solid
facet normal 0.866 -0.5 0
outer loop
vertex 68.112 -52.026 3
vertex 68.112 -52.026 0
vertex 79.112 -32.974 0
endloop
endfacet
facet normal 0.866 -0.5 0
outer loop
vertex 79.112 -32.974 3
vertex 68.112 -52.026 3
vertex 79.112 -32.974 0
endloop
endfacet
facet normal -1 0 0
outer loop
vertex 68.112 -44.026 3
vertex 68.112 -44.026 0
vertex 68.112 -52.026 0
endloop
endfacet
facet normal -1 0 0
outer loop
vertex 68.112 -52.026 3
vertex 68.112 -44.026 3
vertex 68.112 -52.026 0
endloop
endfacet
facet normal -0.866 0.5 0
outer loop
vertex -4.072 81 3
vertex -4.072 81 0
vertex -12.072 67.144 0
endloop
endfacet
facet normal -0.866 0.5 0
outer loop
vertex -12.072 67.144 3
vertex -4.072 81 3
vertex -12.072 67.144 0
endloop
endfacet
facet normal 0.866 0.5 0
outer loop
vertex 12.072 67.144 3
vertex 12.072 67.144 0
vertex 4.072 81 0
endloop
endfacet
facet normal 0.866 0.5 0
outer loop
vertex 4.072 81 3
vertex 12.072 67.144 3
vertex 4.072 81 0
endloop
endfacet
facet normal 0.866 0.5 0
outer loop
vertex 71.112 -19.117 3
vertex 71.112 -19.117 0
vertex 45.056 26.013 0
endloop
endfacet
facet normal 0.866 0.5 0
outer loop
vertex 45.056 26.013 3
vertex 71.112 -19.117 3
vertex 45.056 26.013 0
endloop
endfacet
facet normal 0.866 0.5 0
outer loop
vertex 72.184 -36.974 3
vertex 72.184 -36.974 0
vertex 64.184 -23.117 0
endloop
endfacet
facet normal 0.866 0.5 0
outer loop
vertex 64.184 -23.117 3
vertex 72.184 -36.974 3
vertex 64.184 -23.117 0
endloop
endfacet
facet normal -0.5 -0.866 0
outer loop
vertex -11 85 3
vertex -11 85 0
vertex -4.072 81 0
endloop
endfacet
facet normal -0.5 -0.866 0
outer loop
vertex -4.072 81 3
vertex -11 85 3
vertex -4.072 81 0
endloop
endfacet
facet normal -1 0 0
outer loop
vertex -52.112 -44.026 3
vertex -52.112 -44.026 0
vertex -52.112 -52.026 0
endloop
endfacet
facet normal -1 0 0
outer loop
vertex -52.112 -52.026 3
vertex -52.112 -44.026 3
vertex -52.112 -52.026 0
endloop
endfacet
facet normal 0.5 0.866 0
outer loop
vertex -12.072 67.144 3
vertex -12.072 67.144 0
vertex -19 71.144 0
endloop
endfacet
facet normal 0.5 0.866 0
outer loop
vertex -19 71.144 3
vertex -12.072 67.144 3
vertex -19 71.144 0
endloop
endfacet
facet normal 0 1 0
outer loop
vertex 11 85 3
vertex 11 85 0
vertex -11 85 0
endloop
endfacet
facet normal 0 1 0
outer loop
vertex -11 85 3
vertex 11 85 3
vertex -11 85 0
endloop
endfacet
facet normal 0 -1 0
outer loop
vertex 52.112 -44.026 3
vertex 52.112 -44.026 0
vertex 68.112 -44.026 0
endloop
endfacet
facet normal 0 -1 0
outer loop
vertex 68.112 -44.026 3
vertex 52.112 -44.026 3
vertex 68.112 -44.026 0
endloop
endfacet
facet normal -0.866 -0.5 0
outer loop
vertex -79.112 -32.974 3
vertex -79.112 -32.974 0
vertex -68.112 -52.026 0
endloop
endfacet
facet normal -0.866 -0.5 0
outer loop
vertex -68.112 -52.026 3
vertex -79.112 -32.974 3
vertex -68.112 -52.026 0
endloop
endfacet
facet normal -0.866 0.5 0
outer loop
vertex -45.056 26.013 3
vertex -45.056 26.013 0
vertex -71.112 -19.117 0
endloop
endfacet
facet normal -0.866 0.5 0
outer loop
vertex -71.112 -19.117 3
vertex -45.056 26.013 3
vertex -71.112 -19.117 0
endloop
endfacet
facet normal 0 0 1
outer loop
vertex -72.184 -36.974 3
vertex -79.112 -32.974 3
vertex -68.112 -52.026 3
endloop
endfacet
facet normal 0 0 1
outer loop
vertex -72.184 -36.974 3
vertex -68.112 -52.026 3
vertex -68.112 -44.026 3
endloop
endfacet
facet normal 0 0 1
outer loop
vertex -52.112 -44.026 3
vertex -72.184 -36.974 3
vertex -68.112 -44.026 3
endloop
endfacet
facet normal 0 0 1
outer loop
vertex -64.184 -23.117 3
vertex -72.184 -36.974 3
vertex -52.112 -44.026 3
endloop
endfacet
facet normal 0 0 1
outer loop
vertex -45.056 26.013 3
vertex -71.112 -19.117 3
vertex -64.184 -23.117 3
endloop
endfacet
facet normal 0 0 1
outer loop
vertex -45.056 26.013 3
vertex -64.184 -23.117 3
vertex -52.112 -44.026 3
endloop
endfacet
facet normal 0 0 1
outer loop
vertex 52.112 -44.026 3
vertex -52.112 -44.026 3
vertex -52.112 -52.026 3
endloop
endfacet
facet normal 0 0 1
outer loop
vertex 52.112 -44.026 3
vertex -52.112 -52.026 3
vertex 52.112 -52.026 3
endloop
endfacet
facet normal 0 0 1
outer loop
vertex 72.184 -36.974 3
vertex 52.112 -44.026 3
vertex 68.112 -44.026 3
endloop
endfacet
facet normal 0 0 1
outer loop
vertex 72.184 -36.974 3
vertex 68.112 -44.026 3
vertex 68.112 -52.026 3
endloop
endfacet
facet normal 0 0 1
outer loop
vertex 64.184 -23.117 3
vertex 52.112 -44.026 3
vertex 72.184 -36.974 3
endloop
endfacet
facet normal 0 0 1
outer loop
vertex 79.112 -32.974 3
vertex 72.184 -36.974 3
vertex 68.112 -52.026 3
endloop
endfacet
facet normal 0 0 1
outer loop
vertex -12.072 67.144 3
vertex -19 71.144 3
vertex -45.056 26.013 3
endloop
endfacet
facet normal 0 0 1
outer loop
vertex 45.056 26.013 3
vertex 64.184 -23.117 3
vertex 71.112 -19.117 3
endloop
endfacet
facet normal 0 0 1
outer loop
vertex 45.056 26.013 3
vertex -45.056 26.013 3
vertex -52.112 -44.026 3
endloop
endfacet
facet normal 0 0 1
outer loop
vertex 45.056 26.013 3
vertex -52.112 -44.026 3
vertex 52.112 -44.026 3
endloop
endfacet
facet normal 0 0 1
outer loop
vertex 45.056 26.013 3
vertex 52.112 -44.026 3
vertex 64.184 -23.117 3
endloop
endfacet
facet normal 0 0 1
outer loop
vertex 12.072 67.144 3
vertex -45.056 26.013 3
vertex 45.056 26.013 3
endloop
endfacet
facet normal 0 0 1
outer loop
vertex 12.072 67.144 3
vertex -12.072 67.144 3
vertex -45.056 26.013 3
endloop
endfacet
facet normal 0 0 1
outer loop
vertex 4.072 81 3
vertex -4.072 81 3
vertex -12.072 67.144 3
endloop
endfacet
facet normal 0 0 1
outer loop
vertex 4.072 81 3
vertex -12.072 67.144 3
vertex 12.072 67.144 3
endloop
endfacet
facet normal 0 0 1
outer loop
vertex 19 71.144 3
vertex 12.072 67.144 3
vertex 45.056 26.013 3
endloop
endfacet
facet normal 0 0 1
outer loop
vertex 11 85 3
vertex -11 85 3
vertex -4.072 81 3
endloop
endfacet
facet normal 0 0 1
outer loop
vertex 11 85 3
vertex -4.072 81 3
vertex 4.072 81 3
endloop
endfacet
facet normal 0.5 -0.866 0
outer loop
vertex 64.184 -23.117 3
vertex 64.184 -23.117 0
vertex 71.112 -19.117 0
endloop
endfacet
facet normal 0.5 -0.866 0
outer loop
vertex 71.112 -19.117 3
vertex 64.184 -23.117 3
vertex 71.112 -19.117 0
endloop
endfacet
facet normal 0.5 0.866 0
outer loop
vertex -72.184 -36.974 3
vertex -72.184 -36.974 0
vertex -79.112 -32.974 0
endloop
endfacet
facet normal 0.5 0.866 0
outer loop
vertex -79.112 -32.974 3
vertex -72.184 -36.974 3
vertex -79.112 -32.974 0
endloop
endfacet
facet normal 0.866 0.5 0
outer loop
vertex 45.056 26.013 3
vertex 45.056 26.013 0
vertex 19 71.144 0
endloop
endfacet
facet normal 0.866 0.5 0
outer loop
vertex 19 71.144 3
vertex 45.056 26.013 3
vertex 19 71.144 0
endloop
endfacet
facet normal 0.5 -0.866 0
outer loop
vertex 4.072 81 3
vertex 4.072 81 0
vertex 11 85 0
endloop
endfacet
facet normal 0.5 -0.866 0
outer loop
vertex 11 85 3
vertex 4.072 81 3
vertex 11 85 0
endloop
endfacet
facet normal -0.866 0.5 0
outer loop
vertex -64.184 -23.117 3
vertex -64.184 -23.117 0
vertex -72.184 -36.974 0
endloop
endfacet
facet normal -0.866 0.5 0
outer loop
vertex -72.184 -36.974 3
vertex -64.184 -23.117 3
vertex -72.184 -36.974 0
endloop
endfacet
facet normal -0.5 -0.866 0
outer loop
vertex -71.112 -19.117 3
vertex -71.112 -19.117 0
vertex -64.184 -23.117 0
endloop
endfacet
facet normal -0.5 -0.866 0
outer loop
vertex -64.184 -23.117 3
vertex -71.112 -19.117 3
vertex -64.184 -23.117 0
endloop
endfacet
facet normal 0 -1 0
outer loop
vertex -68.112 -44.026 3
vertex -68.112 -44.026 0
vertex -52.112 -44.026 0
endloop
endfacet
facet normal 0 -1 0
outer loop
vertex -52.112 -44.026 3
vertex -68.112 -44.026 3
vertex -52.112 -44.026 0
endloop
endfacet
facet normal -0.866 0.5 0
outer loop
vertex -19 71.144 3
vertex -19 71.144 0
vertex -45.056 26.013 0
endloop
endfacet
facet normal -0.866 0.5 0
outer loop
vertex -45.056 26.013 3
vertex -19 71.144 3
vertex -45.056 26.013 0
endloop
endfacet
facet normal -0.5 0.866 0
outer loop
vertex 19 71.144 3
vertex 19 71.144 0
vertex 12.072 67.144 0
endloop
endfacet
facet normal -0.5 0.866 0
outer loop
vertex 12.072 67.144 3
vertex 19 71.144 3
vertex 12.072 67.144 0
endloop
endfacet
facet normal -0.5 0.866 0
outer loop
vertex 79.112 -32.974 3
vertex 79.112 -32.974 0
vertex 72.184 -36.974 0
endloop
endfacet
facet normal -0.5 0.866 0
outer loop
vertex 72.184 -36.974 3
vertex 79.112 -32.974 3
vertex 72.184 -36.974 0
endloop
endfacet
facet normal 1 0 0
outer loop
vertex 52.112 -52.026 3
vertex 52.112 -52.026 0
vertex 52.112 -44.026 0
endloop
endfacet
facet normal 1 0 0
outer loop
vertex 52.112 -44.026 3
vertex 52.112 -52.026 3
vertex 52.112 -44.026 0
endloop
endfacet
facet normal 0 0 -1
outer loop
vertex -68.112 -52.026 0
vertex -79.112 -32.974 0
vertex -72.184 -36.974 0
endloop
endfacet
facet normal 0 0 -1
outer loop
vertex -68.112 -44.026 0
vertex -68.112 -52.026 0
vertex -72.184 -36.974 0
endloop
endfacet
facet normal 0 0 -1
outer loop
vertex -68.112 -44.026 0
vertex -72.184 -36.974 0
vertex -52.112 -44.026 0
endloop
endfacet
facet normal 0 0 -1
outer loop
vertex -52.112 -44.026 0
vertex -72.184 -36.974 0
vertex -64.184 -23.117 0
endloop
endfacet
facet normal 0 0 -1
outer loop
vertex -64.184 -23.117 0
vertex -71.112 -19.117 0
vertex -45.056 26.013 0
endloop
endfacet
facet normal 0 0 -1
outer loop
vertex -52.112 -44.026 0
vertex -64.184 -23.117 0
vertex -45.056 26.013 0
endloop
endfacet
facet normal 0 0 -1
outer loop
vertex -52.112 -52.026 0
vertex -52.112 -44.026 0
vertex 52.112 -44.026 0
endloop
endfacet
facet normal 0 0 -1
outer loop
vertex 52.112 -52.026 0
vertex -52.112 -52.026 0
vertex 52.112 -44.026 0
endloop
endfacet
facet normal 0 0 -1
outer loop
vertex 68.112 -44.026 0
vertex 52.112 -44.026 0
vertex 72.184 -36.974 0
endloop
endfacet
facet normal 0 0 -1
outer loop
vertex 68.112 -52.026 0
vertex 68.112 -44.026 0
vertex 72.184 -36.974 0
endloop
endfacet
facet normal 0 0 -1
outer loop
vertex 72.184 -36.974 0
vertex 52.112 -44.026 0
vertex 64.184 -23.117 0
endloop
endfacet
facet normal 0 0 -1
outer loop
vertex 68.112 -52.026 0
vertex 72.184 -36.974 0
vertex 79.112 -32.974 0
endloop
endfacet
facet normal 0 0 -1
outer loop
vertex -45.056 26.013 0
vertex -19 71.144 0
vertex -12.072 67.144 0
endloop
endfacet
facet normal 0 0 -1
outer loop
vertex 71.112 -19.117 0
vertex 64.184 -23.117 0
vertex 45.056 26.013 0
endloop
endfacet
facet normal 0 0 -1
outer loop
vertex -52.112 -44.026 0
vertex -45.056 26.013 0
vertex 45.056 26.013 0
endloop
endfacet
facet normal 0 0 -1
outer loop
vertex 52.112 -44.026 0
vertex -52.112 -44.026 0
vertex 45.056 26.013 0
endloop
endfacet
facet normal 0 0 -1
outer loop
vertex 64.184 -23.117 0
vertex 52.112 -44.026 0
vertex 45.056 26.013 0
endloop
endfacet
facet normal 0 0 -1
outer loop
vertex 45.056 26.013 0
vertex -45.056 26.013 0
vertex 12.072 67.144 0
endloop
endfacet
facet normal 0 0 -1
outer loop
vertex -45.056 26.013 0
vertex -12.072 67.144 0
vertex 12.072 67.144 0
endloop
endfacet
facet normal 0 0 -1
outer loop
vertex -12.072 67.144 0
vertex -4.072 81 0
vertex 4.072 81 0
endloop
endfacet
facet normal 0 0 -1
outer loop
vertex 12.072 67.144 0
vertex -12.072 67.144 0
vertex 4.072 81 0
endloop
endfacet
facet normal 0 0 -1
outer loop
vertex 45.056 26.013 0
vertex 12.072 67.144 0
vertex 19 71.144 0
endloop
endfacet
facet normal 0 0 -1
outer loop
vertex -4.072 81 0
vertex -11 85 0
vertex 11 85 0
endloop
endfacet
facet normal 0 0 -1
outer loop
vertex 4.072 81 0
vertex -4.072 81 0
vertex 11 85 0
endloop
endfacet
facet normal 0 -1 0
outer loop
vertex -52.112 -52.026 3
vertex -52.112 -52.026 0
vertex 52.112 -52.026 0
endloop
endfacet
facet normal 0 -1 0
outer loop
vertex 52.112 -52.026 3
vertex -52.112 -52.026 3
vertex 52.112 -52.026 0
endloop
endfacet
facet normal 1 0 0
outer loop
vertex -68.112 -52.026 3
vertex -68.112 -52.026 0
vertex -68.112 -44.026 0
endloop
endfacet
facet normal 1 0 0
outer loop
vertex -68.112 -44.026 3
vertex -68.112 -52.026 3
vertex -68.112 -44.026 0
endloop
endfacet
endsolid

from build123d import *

# Parameters (mm, degrees)
F1_DEPTH = 3


with BuildPart() as f1:
    # F0 (on Top) → F1 (new body)
    with BuildSketch(Plane.XY):
        Polygon((-36.8060796608, 21.25), (0, 85), (-11, 85), (-4.0717967697, 81), (-12.0717967697, 67.1435935394), (-19, 71.1435935394), (-45.0560796608, 26.0131397208), align=None)
        Polygon((0, 0), (0, 85), (-36.8060796608, 21.25), align=None)
        Polygon((36.8060796608, 21.25), (0, 85), (0, 0), align=None)
        Polygon((11, 85), (0, 85), (36.8060796608, 21.25), (45.0560796608, 26.0131397208), (19, 71.1435935394), (12.0717967697, 67.1435935394), (4.0717967697, 81), align=None)
        Polygon((45.0560796608, 26.0131397208), (36.8060796608, 21.25), (73.6121593217, -42.5), (79.1121593217, -32.9737205584), (72.1839560914, -36.9737205584), (64.1839560914, -23.1173140978), (71.1121593217, -19.1173140978), align=None)
        Polygon((73.6121593217, -42.5), (36.8060796608, 21.25), (0, 0), align=None)
        Polygon((73.6121593217, -42.5), (0, 0), (-73.6121593217, -42.5), align=None)
        Polygon((0, 0), (-36.8060796608, 21.25), (-73.6121593217, -42.5), align=None)
        Polygon((-73.6121593217, -42.5), (-36.8060796608, 21.25), (-45.0560796608, 26.0131397208), (-71.1121593217, -19.1173140978), (-64.1839560914, -23.1173140978), (-72.1839560914, -36.9737205584), (-79.1121593217, -32.9737205584), align=None)
        Polygon((68.1121593217, -52.0262794416), (73.6121593217, -42.5), (-73.6121593217, -42.5), (-68.1121593217, -52.0262794416), (-68.1121593217, -44.0262794416), (-52.1121593217, -44.0262794416), (-52.1121593217, -52.0262794416), (52.1121593217, -52.0262794416), (52.1121593217, -44.0262794416), (68.1121593217, -44.0262794416), align=None)
    extrude(amount=F1_DEPTH)


solid = f1.part
